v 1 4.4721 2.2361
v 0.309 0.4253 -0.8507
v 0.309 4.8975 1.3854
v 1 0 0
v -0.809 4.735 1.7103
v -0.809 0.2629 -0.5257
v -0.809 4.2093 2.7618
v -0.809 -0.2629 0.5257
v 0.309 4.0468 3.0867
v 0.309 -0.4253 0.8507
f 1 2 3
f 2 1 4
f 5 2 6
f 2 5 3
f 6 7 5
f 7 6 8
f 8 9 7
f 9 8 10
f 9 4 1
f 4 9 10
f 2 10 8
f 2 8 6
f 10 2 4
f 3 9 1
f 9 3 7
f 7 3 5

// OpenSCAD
// In order to calculate the normal for a plane, we first
// need the planar coefficients
function PlaneCoA(pt1, pt2, pt3) =  pt1[1]*(pt2[2]-pt3[2]) + pt2[1]*(pt3[2]-pt1[2])+pt3[1]*(pt1[2]-pt2[2]);
function PlaneCoB(pt1, pt2, pt3) =  pt1[2]*(pt2[0]-pt3[0]) + pt2[2]*(pt3[0]-pt1[0])+pt3[2]*(pt1[0]-pt2[0]);
function PlaneCoC(pt1, pt2, pt3) =  pt1[0]*(pt2[1]-pt3[1]) + pt2[0]*(pt3[1]-pt1[1])+pt3[0]*(pt1[1]-pt2[1]);
function PlaneCoD(pt1, pt2, pt3) =  (-pt1[0]*(pt2[1]*pt3[2]-pt3[1]*pt2[2])-pt2[0]*(pt3[1]*pt1[2]-pt1[1]*pt3[2])-pt3[0]*(pt1[1]*pt2[2]-pt2[1]*pt1[2]));

function PlaneNormal(pt1, pt2, pt3) = [PlaneCoA(pt1, pt2, pt3), PlaneCoB(pt1, pt2, pt3), PlaneCoC(pt1,pt2,pt3)];

function AngleRightSides(adjacent, opposite) =  atan(opposite/adjacent);
function RotationFromNormal(normal) = [
	AngleRightSides(normal[2],normal[1]), 
	AngleRightSides(normal[2],normal[0]), 
	AngleRightSides(normal[1],normal[0]) ];

// Calculation of Point on a plane takes the form
// Ax + By + Cz + D != 0
// < 0, then x,y,z is 'inside'
// > 0, then x,y,z is 'outside'
// == 0, then x,y,z is 'on' 
//function PointOnPlane(pt, plane) = pt[0] * PlaneCoA() + pt[1]*PlaneCoB() + pt[2]*PlaneCoC() + PlaneCoD();



//DisplayNormalRotationValues([10,10,10]);
//RenderNormal([10,10,10]);
RenderTrianglePatch([0,0,0],[10,0,0],[5,5,10]);

module DisplayNormalRotationValues(normal)
{
	echo("Normal: ", normal[0], normal[1], normal[2]);

	echo("Rot X: ", AngleRightSides(normal[2], normal[1]));

	echo("Rot Y: ", AngleRightSides(normal[2],normal[0]));

	echo("Rot Z: ", AngleRightSides(normal[1],normal[0]) );

}

module RenderNormal(normal)
{
	echo(RotationFromNormal(normal));

	rotate(RotationFromNormal(normal))	
	cylinder(r=1, h=5);
}

module RenderTrianglePatch(p1, p2, p3, height=4)
{
	echo("Normal: ", PlaneNormal(p1, p2, p3));

	RenderNormal( PlaneNormal(p1, p2, p3));

//	linear_extrude(height = height, convexity = 10) 
//	polygon( 
//		points=[p1, p2, p3],
//		paths=[[0,1,2,0]]
//	);
}
